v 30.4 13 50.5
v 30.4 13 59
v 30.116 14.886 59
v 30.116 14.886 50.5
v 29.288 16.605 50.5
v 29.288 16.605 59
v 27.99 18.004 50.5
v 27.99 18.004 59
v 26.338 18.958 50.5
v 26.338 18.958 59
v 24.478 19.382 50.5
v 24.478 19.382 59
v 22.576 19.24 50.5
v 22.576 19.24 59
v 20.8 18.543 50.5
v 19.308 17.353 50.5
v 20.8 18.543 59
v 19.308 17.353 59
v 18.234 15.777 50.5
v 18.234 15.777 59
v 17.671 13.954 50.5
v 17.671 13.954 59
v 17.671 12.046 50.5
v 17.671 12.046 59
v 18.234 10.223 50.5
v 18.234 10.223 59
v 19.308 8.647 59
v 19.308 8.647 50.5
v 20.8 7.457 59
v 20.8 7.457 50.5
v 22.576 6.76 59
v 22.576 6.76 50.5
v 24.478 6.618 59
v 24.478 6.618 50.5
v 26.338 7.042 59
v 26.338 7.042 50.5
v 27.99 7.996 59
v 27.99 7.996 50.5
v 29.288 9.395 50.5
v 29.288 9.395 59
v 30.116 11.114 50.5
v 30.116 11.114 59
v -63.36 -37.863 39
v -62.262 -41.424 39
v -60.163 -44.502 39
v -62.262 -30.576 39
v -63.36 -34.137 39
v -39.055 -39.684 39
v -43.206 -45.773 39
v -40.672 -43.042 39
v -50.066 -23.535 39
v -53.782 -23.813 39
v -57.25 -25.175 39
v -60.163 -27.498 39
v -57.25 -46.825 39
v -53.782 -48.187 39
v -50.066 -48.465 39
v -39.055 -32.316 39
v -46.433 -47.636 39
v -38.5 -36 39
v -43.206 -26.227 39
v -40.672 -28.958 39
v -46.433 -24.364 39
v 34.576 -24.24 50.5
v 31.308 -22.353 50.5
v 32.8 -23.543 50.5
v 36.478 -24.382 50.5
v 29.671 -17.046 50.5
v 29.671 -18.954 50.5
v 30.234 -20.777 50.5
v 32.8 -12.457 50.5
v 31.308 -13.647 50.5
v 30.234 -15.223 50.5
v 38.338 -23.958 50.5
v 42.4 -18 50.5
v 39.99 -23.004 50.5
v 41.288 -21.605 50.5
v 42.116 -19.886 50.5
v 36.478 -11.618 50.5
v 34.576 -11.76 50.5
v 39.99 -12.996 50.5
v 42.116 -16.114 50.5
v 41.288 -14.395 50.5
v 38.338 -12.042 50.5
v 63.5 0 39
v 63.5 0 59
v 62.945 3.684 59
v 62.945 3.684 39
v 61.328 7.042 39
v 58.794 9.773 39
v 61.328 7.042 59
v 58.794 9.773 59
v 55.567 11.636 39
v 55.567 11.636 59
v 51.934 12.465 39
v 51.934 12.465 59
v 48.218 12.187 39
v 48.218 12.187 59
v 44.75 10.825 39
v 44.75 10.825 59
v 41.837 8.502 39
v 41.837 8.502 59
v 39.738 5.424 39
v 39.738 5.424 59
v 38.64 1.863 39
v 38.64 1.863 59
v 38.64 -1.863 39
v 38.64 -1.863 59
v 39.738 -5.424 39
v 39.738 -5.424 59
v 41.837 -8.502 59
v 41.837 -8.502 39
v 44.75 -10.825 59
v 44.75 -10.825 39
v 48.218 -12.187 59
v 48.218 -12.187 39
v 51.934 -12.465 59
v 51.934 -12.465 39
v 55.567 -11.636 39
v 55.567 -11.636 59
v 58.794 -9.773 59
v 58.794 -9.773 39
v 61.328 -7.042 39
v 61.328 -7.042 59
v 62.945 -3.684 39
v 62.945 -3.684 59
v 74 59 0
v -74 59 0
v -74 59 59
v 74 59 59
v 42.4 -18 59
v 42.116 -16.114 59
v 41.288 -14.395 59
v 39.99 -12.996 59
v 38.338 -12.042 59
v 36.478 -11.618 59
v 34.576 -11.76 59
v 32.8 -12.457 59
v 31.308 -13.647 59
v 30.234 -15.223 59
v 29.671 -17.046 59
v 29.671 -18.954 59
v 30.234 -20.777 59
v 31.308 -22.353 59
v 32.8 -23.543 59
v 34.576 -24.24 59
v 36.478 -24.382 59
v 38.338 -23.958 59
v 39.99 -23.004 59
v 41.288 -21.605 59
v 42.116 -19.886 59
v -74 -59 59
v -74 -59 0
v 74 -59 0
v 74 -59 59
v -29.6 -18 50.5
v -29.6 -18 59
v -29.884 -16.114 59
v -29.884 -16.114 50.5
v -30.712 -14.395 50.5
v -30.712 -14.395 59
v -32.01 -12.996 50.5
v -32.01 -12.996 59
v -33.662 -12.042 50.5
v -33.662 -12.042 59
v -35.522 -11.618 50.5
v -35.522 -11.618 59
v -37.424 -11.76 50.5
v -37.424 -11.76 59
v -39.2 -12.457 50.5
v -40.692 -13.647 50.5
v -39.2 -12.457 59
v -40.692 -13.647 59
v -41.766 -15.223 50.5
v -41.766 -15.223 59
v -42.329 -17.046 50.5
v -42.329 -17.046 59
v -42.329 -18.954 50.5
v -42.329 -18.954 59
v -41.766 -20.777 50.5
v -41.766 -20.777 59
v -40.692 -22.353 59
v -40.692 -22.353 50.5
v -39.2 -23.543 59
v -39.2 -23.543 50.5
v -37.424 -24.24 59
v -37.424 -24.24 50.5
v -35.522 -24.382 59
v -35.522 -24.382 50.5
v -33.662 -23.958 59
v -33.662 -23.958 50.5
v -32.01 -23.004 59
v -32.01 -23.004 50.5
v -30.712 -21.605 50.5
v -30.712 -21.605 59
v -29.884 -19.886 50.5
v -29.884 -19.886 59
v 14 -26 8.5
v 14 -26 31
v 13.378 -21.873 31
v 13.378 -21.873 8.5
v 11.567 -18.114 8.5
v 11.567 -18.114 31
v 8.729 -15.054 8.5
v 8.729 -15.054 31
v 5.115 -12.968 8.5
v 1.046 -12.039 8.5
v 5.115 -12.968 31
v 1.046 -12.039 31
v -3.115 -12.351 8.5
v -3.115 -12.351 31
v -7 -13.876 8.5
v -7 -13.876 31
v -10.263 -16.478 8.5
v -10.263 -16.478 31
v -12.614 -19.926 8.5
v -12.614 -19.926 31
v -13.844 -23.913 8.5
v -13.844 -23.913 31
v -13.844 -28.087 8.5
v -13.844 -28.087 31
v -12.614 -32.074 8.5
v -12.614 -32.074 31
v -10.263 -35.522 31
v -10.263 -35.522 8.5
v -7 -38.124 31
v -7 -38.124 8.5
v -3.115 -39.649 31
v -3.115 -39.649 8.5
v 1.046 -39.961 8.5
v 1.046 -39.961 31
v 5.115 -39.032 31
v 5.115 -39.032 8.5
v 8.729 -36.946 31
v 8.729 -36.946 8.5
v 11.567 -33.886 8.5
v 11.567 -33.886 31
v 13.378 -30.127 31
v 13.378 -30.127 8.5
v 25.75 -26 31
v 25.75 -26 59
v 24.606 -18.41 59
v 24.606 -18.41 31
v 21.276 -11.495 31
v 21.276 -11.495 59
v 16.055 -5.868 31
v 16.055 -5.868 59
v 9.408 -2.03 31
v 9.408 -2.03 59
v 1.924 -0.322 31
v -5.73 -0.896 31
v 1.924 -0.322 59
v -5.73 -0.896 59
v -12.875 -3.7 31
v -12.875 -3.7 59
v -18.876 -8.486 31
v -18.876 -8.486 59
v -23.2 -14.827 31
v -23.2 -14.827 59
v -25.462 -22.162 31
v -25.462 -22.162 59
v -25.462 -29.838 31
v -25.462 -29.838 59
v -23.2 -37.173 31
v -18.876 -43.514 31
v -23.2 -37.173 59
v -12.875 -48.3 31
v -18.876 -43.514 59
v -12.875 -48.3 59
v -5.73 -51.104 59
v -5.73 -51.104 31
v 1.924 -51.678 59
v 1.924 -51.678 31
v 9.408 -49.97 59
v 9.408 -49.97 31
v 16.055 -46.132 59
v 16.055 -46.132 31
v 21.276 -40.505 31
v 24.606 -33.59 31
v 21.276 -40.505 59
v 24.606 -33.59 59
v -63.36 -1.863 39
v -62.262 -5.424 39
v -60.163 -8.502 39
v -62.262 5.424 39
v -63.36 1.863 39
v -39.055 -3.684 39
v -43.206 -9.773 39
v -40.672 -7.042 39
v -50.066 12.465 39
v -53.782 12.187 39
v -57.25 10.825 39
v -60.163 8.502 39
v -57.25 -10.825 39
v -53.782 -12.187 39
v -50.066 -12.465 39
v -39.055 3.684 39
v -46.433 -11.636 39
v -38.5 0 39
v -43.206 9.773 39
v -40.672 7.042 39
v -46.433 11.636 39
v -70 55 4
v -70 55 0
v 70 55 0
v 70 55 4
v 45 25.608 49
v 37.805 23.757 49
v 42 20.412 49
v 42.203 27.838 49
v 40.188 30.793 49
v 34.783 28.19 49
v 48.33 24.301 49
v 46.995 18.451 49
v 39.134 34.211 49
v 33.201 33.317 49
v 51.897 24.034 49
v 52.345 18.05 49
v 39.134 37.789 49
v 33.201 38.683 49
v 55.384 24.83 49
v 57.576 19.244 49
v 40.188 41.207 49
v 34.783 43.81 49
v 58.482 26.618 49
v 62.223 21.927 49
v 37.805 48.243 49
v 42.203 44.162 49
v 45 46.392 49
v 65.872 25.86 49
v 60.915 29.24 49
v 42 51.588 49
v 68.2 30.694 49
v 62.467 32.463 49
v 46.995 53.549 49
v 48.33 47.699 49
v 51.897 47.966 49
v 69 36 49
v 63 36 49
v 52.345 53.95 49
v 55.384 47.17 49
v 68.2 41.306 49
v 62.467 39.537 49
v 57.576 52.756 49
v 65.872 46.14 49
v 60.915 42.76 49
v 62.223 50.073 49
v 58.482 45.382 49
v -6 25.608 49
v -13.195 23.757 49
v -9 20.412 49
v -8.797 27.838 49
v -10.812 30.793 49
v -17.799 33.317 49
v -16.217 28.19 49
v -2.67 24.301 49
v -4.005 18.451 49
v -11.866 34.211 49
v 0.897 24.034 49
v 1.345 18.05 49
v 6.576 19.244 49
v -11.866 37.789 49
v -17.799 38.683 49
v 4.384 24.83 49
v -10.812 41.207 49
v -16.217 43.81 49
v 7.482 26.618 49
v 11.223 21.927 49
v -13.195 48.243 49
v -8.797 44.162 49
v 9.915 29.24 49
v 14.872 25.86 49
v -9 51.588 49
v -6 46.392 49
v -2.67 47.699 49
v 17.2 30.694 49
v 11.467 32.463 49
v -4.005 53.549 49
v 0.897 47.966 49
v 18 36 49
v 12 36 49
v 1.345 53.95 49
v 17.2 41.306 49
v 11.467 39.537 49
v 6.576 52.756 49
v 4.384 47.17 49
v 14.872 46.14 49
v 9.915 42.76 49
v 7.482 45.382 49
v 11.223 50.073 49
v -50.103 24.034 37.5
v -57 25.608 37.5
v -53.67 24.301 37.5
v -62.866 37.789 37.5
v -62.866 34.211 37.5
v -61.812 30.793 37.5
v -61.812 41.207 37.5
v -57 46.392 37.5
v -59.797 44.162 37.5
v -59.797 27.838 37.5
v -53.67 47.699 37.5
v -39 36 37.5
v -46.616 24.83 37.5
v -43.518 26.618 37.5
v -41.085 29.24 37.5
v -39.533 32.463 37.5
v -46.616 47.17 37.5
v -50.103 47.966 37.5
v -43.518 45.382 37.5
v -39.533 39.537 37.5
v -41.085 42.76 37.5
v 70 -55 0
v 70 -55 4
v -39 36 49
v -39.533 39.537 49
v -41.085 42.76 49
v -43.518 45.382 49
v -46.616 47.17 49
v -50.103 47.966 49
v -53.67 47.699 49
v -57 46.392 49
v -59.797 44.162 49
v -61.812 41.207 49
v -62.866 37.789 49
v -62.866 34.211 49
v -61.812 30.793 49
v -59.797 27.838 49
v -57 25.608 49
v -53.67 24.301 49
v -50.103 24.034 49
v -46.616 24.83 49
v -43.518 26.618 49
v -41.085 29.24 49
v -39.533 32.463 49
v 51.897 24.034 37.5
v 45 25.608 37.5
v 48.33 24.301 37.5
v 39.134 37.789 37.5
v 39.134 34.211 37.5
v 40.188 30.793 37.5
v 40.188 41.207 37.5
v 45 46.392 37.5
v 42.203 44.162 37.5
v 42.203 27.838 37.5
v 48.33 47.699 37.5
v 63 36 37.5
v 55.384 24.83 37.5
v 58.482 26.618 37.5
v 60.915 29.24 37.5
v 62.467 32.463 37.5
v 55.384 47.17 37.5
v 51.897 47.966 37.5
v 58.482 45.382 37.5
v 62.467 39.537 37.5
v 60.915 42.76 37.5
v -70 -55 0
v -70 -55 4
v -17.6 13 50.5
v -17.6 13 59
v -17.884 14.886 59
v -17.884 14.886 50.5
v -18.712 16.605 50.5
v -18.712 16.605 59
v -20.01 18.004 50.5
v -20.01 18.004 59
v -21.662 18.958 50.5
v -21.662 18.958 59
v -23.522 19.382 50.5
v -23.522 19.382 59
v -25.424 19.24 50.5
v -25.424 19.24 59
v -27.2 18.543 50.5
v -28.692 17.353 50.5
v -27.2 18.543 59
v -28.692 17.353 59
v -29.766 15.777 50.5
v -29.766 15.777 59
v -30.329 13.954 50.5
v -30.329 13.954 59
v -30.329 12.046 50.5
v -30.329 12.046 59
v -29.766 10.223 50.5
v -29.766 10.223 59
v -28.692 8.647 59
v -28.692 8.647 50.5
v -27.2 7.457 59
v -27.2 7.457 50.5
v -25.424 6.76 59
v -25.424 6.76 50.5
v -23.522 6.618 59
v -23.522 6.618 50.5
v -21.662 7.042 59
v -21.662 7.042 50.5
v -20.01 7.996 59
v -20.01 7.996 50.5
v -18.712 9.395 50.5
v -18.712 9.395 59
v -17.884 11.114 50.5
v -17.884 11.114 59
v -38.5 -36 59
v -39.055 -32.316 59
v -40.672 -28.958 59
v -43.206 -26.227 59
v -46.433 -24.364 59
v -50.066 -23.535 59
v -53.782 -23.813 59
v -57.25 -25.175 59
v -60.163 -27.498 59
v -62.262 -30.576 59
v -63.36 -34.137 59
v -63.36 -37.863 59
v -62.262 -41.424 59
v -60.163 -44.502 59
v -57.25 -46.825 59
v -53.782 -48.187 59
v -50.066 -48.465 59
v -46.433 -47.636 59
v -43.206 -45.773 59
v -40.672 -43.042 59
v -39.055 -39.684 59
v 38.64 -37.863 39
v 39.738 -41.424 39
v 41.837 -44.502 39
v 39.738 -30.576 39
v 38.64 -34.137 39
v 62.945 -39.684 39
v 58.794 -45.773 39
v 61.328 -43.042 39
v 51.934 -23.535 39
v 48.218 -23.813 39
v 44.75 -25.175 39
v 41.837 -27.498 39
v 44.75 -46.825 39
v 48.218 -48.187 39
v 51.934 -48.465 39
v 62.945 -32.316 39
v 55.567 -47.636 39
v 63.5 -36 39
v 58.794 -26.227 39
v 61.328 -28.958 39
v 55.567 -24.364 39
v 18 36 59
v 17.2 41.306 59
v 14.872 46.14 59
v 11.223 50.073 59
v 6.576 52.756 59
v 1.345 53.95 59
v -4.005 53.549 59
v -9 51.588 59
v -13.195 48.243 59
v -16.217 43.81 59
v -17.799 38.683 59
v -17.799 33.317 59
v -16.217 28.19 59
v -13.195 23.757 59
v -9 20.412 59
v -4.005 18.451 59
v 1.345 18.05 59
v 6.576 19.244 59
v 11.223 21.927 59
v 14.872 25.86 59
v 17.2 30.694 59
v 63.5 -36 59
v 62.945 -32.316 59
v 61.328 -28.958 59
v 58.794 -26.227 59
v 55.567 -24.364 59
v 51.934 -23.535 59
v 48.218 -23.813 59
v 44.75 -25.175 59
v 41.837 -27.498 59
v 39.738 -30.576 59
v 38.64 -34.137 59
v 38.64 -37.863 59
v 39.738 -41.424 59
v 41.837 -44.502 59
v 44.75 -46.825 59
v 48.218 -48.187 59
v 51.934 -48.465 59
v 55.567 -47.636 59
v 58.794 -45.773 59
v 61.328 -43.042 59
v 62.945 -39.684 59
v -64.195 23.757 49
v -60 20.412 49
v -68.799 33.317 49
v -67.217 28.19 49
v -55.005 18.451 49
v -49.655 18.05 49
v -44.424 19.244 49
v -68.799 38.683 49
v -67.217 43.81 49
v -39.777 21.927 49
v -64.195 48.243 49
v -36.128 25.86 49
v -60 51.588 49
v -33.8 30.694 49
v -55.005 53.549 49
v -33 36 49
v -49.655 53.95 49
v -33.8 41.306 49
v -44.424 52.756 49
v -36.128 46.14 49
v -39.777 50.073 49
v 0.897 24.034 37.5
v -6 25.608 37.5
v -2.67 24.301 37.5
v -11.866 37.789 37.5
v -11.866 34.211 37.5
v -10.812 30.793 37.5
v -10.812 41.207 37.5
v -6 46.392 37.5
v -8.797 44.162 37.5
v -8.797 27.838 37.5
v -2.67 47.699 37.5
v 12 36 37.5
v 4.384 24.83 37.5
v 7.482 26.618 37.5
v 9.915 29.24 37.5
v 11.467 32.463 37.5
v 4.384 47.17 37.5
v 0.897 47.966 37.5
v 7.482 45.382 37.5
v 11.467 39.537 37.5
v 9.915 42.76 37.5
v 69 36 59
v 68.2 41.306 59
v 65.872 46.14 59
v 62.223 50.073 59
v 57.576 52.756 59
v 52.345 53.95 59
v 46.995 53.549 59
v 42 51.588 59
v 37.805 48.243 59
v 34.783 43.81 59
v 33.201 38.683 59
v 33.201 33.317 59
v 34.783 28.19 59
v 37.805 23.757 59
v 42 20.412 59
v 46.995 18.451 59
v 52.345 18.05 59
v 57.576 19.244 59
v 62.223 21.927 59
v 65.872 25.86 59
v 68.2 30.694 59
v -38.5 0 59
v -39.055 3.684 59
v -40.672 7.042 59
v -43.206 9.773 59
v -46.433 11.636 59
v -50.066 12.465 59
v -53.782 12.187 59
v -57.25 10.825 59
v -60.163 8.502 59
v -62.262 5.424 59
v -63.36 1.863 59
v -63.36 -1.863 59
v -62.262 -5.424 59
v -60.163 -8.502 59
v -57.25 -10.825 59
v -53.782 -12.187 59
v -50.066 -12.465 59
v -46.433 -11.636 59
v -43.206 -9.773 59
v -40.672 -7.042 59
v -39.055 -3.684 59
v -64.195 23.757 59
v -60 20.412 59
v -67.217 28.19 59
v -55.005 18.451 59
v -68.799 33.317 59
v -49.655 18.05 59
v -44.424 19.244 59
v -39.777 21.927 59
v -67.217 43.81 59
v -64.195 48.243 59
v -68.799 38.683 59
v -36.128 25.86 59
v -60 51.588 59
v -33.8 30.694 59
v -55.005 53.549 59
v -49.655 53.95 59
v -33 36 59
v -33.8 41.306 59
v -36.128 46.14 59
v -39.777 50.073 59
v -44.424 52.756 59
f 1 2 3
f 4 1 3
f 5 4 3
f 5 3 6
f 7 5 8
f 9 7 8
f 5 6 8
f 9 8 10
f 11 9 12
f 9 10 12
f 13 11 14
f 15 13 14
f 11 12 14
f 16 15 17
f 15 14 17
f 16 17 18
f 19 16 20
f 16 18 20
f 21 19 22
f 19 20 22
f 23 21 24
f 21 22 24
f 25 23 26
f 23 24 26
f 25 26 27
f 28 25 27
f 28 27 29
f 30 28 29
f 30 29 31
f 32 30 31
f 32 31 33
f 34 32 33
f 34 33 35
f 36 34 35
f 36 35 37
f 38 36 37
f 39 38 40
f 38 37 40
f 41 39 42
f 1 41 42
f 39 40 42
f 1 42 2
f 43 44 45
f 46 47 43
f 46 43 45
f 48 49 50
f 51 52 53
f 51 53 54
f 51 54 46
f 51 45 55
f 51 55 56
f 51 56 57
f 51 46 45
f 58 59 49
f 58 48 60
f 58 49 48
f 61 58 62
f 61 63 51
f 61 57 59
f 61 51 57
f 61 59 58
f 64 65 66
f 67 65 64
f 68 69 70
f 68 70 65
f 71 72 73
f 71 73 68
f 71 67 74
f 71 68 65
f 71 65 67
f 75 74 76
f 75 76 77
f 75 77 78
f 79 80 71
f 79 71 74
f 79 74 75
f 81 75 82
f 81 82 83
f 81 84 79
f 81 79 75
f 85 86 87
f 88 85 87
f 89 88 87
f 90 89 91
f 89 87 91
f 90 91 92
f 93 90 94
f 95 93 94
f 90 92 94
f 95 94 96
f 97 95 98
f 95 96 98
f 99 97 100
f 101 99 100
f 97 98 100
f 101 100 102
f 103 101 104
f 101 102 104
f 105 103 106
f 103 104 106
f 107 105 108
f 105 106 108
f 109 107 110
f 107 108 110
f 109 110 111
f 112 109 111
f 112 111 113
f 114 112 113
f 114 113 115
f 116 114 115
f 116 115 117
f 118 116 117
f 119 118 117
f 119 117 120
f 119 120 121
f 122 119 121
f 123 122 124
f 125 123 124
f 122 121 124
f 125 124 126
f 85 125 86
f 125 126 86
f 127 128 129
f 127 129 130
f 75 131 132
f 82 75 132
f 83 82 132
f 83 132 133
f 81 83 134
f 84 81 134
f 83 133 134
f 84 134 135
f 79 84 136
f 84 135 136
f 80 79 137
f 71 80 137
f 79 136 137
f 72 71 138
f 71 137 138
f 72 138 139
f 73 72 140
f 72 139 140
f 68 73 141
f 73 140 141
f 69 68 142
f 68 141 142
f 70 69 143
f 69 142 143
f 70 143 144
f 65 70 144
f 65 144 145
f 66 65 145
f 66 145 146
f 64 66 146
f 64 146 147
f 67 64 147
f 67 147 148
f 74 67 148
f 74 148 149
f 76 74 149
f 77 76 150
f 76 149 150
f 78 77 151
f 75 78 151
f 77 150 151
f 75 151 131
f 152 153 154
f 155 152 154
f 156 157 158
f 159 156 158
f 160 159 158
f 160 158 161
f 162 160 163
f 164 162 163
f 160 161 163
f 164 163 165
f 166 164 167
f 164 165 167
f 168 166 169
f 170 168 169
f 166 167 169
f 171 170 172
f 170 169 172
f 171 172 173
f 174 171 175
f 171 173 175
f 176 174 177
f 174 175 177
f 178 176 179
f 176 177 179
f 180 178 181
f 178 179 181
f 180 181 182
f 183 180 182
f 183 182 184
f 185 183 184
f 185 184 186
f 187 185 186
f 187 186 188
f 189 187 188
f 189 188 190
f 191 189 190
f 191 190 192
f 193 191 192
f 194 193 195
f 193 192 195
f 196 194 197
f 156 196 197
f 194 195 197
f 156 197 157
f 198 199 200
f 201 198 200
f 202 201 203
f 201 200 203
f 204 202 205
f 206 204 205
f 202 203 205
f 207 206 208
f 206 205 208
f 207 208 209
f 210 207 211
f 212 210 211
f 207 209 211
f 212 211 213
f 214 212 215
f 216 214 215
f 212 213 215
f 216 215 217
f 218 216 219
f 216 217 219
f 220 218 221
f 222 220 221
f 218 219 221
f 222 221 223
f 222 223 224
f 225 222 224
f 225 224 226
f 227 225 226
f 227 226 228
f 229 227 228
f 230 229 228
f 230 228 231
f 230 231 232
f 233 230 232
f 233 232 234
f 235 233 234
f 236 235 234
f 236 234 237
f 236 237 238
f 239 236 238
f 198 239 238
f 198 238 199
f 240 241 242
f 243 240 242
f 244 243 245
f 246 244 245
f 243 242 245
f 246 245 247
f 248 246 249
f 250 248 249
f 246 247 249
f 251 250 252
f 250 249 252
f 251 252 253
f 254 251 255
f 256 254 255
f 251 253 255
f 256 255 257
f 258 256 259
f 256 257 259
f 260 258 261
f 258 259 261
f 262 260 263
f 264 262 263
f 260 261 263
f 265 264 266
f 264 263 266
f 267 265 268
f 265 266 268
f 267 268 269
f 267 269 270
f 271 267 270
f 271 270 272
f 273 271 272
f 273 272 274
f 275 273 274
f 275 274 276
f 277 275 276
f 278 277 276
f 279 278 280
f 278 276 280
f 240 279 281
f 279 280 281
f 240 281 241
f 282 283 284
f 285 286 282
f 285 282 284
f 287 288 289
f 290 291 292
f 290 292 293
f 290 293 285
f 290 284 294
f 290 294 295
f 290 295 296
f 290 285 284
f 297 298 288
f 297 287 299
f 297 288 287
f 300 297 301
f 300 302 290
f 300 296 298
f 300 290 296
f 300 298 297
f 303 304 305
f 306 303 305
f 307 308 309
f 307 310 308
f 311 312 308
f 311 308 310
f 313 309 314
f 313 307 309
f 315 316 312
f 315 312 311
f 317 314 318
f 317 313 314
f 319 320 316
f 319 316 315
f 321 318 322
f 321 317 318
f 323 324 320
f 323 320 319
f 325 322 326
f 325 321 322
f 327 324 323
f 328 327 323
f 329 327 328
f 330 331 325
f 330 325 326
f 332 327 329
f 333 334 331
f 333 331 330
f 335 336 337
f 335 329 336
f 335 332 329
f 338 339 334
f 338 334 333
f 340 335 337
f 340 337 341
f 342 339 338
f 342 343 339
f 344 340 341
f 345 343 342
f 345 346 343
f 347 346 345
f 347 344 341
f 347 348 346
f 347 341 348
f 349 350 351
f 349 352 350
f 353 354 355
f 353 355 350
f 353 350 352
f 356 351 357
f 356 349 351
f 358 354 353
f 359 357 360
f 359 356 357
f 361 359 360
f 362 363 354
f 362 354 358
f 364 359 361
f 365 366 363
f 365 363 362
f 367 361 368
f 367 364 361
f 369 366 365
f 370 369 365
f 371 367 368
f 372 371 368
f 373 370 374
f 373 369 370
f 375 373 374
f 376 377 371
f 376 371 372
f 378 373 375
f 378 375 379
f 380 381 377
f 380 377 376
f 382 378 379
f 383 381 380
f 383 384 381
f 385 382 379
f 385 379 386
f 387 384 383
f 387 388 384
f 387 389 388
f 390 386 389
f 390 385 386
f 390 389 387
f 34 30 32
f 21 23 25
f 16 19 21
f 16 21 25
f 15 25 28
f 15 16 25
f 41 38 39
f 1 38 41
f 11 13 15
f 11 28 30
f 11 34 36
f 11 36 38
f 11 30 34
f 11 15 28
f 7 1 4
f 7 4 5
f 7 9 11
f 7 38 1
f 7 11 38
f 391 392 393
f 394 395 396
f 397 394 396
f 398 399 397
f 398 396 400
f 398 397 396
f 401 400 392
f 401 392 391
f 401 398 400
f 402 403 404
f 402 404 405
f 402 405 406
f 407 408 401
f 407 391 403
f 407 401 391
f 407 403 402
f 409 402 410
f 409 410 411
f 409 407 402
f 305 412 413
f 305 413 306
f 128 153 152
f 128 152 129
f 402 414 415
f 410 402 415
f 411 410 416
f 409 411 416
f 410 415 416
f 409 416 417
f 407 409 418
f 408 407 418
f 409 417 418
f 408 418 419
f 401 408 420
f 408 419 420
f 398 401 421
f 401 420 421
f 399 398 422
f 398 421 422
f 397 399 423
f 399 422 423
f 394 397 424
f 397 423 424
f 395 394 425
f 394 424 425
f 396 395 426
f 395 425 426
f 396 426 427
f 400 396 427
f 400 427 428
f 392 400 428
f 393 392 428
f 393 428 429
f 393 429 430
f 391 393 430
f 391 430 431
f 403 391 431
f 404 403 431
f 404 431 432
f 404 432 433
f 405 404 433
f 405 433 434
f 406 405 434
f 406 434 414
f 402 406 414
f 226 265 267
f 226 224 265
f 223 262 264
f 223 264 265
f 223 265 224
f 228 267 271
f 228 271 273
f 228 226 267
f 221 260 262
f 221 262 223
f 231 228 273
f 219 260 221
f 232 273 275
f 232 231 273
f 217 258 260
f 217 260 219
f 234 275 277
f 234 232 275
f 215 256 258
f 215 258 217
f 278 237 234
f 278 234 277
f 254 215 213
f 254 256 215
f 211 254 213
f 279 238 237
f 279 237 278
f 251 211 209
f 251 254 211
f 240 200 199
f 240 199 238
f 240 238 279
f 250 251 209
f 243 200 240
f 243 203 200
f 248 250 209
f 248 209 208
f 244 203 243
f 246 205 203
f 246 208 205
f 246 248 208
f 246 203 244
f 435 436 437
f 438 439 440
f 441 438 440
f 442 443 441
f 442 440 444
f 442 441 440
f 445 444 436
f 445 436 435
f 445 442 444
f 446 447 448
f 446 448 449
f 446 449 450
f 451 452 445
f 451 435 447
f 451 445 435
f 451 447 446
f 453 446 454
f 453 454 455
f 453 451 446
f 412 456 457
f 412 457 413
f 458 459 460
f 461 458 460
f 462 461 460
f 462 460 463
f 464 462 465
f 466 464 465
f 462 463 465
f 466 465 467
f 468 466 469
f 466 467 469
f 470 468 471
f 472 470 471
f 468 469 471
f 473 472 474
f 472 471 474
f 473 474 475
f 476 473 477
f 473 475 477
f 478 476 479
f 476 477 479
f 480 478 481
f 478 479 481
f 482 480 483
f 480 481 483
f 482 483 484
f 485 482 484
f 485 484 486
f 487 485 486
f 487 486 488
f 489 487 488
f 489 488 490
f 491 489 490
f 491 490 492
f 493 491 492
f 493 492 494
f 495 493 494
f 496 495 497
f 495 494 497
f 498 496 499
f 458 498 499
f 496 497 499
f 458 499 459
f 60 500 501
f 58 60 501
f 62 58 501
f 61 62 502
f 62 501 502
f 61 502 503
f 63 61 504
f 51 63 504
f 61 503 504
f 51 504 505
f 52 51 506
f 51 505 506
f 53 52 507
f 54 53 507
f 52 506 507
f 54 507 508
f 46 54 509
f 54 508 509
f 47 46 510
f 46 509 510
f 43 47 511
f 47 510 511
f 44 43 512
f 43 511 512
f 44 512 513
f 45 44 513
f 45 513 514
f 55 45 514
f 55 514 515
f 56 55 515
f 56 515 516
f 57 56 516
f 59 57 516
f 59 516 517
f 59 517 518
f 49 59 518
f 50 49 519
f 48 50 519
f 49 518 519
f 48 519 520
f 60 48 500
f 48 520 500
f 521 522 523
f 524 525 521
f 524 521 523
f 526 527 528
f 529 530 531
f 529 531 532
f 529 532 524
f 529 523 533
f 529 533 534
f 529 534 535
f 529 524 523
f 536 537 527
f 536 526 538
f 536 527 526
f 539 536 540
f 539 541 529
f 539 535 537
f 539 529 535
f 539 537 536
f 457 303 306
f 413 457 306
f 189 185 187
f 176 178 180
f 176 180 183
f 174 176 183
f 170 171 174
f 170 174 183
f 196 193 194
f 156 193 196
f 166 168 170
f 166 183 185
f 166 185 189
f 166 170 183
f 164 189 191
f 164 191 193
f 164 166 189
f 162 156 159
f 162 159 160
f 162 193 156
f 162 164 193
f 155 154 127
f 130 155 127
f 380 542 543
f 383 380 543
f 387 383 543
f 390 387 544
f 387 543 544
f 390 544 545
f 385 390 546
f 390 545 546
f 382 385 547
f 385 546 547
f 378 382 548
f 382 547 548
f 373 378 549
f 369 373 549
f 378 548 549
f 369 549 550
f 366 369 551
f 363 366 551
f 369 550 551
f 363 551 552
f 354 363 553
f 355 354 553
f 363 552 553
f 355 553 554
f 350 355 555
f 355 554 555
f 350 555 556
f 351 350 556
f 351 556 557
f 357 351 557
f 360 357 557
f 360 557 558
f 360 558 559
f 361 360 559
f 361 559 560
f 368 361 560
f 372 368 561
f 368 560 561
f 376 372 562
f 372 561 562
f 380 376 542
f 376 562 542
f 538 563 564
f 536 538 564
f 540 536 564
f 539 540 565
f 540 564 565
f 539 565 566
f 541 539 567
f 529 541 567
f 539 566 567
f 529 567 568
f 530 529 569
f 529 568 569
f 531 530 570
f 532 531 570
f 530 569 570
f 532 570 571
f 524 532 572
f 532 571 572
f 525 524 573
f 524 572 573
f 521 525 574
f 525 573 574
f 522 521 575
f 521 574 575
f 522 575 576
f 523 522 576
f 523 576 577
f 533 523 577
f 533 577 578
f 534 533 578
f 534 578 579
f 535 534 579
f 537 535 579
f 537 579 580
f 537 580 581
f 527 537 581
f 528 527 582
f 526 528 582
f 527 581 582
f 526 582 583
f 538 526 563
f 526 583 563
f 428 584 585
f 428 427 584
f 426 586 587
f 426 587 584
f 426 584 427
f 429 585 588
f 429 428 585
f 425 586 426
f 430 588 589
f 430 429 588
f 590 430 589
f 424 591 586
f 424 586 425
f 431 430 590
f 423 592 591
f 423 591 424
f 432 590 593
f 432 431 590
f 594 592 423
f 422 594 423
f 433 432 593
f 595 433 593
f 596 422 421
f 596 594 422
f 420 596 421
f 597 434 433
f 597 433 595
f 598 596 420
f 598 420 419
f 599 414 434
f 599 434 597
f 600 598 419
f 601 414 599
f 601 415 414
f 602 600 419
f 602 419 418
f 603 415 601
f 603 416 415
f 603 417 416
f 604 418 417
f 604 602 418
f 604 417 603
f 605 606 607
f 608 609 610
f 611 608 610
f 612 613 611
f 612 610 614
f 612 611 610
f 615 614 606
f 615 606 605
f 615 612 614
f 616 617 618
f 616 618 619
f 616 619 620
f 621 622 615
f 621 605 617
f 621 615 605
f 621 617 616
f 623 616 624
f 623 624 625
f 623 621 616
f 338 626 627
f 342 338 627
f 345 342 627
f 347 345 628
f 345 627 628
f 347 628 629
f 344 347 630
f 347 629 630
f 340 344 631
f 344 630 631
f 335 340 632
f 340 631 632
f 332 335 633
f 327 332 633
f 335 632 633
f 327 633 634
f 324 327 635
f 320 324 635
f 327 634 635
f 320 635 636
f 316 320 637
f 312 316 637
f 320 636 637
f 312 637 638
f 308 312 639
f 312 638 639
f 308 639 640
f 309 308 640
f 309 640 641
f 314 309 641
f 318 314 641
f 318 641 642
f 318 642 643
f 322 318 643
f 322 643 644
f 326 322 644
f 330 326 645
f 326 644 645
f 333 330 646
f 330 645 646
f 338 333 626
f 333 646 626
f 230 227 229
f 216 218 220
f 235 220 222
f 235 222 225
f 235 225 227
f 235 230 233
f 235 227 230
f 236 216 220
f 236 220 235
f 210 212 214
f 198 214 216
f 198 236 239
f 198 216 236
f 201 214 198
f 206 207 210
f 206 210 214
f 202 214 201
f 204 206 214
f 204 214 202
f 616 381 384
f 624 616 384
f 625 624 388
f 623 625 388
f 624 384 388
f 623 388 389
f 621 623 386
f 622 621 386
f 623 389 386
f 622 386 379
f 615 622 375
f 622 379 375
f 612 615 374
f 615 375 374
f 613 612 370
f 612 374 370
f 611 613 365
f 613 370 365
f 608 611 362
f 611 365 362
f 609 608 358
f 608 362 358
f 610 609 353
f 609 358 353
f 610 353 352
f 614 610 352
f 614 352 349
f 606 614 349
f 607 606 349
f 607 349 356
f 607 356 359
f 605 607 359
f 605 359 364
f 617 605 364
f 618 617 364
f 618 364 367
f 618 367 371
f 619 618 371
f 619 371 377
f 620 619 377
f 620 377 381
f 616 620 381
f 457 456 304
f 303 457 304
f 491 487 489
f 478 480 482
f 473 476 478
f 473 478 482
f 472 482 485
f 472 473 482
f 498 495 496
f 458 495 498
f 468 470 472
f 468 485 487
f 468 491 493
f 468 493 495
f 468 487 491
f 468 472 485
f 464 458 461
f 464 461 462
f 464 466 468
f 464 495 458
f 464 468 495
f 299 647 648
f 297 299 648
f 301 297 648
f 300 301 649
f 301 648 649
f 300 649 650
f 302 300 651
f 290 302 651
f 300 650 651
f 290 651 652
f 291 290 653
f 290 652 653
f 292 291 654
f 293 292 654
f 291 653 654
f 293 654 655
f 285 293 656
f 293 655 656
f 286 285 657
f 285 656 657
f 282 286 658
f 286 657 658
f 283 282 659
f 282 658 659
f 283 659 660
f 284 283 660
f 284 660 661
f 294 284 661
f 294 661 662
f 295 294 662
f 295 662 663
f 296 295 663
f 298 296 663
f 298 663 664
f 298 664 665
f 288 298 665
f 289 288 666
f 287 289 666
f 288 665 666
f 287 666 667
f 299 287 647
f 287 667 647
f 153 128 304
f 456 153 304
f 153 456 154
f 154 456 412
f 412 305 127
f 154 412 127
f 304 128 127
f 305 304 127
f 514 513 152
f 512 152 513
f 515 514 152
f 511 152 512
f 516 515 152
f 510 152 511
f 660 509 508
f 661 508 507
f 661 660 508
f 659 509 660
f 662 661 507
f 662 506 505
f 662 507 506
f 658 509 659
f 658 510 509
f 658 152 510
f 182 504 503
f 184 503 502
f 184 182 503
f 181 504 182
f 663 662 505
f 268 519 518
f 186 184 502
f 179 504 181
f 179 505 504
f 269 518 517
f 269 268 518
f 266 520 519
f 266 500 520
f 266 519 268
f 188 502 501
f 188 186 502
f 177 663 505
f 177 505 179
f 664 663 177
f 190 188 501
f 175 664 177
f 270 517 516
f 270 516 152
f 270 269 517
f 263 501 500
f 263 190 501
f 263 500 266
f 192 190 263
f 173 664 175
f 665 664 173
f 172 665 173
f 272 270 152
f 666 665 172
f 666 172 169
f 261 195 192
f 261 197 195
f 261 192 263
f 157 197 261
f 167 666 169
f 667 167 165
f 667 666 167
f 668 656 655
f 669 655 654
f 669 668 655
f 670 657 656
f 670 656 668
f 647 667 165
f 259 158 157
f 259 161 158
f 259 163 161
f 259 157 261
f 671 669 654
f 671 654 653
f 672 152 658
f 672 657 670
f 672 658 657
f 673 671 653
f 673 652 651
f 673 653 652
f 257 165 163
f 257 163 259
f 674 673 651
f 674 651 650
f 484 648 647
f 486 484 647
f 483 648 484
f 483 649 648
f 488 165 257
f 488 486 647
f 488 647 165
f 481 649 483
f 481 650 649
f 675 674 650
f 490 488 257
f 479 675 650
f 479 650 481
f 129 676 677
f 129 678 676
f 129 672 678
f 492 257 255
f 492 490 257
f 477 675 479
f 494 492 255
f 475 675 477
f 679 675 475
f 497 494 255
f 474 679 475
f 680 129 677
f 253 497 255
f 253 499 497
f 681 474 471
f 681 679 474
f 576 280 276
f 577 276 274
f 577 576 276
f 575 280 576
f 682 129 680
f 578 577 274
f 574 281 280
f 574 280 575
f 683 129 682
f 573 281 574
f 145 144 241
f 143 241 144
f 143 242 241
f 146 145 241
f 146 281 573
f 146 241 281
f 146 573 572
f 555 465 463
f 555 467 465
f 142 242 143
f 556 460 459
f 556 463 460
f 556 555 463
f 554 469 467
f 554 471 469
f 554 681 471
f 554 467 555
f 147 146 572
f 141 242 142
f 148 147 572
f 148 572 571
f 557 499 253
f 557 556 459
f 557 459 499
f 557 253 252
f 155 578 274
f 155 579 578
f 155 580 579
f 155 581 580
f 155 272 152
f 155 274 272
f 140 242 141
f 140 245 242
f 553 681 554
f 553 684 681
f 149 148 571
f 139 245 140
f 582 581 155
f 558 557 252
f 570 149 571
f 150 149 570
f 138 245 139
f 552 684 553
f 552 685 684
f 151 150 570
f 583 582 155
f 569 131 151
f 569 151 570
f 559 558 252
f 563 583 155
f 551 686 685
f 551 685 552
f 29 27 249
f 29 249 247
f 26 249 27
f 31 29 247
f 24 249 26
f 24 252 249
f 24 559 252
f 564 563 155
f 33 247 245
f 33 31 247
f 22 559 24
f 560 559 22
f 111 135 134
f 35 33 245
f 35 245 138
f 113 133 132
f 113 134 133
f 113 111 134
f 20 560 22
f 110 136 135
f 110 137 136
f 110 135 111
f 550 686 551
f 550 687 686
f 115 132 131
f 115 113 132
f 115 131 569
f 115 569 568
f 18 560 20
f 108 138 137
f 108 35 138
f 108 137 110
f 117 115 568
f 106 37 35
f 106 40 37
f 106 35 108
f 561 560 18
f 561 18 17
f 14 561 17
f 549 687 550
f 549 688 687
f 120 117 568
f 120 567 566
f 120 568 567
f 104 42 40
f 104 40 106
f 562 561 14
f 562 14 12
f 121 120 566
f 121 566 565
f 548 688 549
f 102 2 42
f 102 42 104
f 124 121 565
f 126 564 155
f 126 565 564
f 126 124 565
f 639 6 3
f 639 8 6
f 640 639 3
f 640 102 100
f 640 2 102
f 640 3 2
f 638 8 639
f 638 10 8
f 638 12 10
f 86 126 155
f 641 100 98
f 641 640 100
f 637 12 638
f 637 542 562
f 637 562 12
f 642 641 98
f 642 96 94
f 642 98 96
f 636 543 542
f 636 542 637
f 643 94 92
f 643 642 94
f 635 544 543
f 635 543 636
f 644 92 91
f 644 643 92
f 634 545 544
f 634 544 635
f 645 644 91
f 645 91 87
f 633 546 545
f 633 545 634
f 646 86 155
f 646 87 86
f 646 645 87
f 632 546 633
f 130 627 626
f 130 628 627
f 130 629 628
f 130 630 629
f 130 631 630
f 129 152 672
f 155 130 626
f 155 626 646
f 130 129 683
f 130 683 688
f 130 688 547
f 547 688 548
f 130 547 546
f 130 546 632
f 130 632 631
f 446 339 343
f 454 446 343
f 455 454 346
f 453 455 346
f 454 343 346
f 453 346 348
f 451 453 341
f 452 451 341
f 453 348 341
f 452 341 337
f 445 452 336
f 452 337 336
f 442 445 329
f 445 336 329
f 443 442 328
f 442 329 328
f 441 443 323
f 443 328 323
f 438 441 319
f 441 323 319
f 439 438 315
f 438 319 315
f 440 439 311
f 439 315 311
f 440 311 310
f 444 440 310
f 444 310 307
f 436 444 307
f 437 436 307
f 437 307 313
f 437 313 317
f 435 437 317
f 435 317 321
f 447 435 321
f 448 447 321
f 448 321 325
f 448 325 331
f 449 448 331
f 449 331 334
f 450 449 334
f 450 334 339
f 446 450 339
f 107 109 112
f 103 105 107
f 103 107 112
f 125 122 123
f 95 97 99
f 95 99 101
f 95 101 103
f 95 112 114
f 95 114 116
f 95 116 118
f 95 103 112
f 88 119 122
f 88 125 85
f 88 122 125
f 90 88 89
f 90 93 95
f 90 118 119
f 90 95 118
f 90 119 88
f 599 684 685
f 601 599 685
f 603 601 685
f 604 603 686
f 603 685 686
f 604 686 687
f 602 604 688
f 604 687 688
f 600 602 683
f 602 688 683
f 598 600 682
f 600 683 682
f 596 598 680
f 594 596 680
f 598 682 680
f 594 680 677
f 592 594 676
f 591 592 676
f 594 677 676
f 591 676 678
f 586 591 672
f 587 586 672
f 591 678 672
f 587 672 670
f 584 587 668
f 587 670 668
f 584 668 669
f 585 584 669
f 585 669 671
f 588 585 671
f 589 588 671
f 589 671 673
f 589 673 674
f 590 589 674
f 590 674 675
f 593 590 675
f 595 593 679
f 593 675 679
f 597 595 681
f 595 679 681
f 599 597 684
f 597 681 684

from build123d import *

# Parameters (mm, degrees)
F0_W      = 148
F0_H      = 118
F1_DEPTH  = 59
F2_R      = 14
F3_DEPTH  = 50.5
F2_R_2    = 25.75
F4_DEPTH  = 28
F2_R_3    = 12
F5_DEPTH  = 21.5
F2_R_4    = 18
F6_DEPTH  = 10
F2_R_5    = 6.4
F7_DEPTH  = 8.5
F2_R_6    = 12.5
F8_DEPTH  = 20
F9_W      = 140
F9_H      = 110
F10_DEPTH = 4


with BuildPart() as f1:
    # F0 (on Top) → F1 (new body)
    with BuildSketch(Plane.XY):
        Rectangle(F0_W, F0_H)
    extrude(amount=F1_DEPTH)

    # F2 (on face) → F3 (cut)
    with BuildSketch(Plane.XY.offset(59)):
        with Locations((0, -26)):
            Circle(F2_R)
    extrude(amount=-F3_DEPTH, mode=Mode.SUBTRACT)

    # F2 (on face) → F4 (cut)
    with BuildSketch(Plane.XY.offset(59)):
        with Locations((0, -26)):
            Circle(F2_R_2)
        with Locations((0, -26)):
            Circle(F2_R, mode=Mode.SUBTRACT)
    extrude(amount=-F4_DEPTH, mode=Mode.SUBTRACT)

    # F2 (on face) → F5 (cut)
    with BuildSketch(Plane.XY.offset(59)):
        with Locations((-51, 36)):
            Circle(F2_R_3)
        with Locations((0, 36)):
            Circle(F2_R_3)
        with Locations((51, 36)):
            Circle(F2_R_3)
    extrude(amount=-F5_DEPTH, mode=Mode.SUBTRACT)

    # F2 (on face) → F6 (cut)
    with BuildSketch(Plane.XY.offset(59)):
        with Locations((-51, 36)):
            Circle(F2_R_4)
        with Locations((-51, 36)):
            Circle(F2_R_3, mode=Mode.SUBTRACT)
        with Locations((0, 36)):
            Circle(F2_R_4)
        with Locations((0, 36)):
            Circle(F2_R_3, mode=Mode.SUBTRACT)
        with Locations((51, 36)):
            Circle(F2_R_4)
        with Locations((51, 36)):
            Circle(F2_R_3, mode=Mode.SUBTRACT)
    extrude(amount=-F6_DEPTH, mode=Mode.SUBTRACT)

    # F2 (on face) → F7 (cut)
    with BuildSketch(Plane.XY.offset(59)):
        with Locations((-36, -18)):
            Circle(F2_R_5)
        with Locations((-24, 13)):
            Circle(F2_R_5)
        with Locations((24, 13)):
            Circle(F2_R_5)
        with Locations((36, -18)):
            Circle(F2_R_5)
    extrude(amount=-F7_DEPTH, mode=Mode.SUBTRACT)

    # F2 (on face) → F8 (cut)
    with BuildSketch(Plane.XY.offset(59)):
        with Locations((-51, -36)):
            Circle(F2_R_6)
        with Locations((-51, 0)):
            Circle(F2_R_6)
        with Locations((51, 0)):
            Circle(F2_R_6)
        with Locations((51, -36)):
            Circle(F2_R_6)
    extrude(amount=-F8_DEPTH, mode=Mode.SUBTRACT)

    # F9 (on face) → F10 (cut)
    with BuildSketch(Plane.XY):
        Rectangle(F9_W, F9_H)
    extrude(amount=F10_DEPTH, mode=Mode.SUBTRACT)


solid = f1.part
